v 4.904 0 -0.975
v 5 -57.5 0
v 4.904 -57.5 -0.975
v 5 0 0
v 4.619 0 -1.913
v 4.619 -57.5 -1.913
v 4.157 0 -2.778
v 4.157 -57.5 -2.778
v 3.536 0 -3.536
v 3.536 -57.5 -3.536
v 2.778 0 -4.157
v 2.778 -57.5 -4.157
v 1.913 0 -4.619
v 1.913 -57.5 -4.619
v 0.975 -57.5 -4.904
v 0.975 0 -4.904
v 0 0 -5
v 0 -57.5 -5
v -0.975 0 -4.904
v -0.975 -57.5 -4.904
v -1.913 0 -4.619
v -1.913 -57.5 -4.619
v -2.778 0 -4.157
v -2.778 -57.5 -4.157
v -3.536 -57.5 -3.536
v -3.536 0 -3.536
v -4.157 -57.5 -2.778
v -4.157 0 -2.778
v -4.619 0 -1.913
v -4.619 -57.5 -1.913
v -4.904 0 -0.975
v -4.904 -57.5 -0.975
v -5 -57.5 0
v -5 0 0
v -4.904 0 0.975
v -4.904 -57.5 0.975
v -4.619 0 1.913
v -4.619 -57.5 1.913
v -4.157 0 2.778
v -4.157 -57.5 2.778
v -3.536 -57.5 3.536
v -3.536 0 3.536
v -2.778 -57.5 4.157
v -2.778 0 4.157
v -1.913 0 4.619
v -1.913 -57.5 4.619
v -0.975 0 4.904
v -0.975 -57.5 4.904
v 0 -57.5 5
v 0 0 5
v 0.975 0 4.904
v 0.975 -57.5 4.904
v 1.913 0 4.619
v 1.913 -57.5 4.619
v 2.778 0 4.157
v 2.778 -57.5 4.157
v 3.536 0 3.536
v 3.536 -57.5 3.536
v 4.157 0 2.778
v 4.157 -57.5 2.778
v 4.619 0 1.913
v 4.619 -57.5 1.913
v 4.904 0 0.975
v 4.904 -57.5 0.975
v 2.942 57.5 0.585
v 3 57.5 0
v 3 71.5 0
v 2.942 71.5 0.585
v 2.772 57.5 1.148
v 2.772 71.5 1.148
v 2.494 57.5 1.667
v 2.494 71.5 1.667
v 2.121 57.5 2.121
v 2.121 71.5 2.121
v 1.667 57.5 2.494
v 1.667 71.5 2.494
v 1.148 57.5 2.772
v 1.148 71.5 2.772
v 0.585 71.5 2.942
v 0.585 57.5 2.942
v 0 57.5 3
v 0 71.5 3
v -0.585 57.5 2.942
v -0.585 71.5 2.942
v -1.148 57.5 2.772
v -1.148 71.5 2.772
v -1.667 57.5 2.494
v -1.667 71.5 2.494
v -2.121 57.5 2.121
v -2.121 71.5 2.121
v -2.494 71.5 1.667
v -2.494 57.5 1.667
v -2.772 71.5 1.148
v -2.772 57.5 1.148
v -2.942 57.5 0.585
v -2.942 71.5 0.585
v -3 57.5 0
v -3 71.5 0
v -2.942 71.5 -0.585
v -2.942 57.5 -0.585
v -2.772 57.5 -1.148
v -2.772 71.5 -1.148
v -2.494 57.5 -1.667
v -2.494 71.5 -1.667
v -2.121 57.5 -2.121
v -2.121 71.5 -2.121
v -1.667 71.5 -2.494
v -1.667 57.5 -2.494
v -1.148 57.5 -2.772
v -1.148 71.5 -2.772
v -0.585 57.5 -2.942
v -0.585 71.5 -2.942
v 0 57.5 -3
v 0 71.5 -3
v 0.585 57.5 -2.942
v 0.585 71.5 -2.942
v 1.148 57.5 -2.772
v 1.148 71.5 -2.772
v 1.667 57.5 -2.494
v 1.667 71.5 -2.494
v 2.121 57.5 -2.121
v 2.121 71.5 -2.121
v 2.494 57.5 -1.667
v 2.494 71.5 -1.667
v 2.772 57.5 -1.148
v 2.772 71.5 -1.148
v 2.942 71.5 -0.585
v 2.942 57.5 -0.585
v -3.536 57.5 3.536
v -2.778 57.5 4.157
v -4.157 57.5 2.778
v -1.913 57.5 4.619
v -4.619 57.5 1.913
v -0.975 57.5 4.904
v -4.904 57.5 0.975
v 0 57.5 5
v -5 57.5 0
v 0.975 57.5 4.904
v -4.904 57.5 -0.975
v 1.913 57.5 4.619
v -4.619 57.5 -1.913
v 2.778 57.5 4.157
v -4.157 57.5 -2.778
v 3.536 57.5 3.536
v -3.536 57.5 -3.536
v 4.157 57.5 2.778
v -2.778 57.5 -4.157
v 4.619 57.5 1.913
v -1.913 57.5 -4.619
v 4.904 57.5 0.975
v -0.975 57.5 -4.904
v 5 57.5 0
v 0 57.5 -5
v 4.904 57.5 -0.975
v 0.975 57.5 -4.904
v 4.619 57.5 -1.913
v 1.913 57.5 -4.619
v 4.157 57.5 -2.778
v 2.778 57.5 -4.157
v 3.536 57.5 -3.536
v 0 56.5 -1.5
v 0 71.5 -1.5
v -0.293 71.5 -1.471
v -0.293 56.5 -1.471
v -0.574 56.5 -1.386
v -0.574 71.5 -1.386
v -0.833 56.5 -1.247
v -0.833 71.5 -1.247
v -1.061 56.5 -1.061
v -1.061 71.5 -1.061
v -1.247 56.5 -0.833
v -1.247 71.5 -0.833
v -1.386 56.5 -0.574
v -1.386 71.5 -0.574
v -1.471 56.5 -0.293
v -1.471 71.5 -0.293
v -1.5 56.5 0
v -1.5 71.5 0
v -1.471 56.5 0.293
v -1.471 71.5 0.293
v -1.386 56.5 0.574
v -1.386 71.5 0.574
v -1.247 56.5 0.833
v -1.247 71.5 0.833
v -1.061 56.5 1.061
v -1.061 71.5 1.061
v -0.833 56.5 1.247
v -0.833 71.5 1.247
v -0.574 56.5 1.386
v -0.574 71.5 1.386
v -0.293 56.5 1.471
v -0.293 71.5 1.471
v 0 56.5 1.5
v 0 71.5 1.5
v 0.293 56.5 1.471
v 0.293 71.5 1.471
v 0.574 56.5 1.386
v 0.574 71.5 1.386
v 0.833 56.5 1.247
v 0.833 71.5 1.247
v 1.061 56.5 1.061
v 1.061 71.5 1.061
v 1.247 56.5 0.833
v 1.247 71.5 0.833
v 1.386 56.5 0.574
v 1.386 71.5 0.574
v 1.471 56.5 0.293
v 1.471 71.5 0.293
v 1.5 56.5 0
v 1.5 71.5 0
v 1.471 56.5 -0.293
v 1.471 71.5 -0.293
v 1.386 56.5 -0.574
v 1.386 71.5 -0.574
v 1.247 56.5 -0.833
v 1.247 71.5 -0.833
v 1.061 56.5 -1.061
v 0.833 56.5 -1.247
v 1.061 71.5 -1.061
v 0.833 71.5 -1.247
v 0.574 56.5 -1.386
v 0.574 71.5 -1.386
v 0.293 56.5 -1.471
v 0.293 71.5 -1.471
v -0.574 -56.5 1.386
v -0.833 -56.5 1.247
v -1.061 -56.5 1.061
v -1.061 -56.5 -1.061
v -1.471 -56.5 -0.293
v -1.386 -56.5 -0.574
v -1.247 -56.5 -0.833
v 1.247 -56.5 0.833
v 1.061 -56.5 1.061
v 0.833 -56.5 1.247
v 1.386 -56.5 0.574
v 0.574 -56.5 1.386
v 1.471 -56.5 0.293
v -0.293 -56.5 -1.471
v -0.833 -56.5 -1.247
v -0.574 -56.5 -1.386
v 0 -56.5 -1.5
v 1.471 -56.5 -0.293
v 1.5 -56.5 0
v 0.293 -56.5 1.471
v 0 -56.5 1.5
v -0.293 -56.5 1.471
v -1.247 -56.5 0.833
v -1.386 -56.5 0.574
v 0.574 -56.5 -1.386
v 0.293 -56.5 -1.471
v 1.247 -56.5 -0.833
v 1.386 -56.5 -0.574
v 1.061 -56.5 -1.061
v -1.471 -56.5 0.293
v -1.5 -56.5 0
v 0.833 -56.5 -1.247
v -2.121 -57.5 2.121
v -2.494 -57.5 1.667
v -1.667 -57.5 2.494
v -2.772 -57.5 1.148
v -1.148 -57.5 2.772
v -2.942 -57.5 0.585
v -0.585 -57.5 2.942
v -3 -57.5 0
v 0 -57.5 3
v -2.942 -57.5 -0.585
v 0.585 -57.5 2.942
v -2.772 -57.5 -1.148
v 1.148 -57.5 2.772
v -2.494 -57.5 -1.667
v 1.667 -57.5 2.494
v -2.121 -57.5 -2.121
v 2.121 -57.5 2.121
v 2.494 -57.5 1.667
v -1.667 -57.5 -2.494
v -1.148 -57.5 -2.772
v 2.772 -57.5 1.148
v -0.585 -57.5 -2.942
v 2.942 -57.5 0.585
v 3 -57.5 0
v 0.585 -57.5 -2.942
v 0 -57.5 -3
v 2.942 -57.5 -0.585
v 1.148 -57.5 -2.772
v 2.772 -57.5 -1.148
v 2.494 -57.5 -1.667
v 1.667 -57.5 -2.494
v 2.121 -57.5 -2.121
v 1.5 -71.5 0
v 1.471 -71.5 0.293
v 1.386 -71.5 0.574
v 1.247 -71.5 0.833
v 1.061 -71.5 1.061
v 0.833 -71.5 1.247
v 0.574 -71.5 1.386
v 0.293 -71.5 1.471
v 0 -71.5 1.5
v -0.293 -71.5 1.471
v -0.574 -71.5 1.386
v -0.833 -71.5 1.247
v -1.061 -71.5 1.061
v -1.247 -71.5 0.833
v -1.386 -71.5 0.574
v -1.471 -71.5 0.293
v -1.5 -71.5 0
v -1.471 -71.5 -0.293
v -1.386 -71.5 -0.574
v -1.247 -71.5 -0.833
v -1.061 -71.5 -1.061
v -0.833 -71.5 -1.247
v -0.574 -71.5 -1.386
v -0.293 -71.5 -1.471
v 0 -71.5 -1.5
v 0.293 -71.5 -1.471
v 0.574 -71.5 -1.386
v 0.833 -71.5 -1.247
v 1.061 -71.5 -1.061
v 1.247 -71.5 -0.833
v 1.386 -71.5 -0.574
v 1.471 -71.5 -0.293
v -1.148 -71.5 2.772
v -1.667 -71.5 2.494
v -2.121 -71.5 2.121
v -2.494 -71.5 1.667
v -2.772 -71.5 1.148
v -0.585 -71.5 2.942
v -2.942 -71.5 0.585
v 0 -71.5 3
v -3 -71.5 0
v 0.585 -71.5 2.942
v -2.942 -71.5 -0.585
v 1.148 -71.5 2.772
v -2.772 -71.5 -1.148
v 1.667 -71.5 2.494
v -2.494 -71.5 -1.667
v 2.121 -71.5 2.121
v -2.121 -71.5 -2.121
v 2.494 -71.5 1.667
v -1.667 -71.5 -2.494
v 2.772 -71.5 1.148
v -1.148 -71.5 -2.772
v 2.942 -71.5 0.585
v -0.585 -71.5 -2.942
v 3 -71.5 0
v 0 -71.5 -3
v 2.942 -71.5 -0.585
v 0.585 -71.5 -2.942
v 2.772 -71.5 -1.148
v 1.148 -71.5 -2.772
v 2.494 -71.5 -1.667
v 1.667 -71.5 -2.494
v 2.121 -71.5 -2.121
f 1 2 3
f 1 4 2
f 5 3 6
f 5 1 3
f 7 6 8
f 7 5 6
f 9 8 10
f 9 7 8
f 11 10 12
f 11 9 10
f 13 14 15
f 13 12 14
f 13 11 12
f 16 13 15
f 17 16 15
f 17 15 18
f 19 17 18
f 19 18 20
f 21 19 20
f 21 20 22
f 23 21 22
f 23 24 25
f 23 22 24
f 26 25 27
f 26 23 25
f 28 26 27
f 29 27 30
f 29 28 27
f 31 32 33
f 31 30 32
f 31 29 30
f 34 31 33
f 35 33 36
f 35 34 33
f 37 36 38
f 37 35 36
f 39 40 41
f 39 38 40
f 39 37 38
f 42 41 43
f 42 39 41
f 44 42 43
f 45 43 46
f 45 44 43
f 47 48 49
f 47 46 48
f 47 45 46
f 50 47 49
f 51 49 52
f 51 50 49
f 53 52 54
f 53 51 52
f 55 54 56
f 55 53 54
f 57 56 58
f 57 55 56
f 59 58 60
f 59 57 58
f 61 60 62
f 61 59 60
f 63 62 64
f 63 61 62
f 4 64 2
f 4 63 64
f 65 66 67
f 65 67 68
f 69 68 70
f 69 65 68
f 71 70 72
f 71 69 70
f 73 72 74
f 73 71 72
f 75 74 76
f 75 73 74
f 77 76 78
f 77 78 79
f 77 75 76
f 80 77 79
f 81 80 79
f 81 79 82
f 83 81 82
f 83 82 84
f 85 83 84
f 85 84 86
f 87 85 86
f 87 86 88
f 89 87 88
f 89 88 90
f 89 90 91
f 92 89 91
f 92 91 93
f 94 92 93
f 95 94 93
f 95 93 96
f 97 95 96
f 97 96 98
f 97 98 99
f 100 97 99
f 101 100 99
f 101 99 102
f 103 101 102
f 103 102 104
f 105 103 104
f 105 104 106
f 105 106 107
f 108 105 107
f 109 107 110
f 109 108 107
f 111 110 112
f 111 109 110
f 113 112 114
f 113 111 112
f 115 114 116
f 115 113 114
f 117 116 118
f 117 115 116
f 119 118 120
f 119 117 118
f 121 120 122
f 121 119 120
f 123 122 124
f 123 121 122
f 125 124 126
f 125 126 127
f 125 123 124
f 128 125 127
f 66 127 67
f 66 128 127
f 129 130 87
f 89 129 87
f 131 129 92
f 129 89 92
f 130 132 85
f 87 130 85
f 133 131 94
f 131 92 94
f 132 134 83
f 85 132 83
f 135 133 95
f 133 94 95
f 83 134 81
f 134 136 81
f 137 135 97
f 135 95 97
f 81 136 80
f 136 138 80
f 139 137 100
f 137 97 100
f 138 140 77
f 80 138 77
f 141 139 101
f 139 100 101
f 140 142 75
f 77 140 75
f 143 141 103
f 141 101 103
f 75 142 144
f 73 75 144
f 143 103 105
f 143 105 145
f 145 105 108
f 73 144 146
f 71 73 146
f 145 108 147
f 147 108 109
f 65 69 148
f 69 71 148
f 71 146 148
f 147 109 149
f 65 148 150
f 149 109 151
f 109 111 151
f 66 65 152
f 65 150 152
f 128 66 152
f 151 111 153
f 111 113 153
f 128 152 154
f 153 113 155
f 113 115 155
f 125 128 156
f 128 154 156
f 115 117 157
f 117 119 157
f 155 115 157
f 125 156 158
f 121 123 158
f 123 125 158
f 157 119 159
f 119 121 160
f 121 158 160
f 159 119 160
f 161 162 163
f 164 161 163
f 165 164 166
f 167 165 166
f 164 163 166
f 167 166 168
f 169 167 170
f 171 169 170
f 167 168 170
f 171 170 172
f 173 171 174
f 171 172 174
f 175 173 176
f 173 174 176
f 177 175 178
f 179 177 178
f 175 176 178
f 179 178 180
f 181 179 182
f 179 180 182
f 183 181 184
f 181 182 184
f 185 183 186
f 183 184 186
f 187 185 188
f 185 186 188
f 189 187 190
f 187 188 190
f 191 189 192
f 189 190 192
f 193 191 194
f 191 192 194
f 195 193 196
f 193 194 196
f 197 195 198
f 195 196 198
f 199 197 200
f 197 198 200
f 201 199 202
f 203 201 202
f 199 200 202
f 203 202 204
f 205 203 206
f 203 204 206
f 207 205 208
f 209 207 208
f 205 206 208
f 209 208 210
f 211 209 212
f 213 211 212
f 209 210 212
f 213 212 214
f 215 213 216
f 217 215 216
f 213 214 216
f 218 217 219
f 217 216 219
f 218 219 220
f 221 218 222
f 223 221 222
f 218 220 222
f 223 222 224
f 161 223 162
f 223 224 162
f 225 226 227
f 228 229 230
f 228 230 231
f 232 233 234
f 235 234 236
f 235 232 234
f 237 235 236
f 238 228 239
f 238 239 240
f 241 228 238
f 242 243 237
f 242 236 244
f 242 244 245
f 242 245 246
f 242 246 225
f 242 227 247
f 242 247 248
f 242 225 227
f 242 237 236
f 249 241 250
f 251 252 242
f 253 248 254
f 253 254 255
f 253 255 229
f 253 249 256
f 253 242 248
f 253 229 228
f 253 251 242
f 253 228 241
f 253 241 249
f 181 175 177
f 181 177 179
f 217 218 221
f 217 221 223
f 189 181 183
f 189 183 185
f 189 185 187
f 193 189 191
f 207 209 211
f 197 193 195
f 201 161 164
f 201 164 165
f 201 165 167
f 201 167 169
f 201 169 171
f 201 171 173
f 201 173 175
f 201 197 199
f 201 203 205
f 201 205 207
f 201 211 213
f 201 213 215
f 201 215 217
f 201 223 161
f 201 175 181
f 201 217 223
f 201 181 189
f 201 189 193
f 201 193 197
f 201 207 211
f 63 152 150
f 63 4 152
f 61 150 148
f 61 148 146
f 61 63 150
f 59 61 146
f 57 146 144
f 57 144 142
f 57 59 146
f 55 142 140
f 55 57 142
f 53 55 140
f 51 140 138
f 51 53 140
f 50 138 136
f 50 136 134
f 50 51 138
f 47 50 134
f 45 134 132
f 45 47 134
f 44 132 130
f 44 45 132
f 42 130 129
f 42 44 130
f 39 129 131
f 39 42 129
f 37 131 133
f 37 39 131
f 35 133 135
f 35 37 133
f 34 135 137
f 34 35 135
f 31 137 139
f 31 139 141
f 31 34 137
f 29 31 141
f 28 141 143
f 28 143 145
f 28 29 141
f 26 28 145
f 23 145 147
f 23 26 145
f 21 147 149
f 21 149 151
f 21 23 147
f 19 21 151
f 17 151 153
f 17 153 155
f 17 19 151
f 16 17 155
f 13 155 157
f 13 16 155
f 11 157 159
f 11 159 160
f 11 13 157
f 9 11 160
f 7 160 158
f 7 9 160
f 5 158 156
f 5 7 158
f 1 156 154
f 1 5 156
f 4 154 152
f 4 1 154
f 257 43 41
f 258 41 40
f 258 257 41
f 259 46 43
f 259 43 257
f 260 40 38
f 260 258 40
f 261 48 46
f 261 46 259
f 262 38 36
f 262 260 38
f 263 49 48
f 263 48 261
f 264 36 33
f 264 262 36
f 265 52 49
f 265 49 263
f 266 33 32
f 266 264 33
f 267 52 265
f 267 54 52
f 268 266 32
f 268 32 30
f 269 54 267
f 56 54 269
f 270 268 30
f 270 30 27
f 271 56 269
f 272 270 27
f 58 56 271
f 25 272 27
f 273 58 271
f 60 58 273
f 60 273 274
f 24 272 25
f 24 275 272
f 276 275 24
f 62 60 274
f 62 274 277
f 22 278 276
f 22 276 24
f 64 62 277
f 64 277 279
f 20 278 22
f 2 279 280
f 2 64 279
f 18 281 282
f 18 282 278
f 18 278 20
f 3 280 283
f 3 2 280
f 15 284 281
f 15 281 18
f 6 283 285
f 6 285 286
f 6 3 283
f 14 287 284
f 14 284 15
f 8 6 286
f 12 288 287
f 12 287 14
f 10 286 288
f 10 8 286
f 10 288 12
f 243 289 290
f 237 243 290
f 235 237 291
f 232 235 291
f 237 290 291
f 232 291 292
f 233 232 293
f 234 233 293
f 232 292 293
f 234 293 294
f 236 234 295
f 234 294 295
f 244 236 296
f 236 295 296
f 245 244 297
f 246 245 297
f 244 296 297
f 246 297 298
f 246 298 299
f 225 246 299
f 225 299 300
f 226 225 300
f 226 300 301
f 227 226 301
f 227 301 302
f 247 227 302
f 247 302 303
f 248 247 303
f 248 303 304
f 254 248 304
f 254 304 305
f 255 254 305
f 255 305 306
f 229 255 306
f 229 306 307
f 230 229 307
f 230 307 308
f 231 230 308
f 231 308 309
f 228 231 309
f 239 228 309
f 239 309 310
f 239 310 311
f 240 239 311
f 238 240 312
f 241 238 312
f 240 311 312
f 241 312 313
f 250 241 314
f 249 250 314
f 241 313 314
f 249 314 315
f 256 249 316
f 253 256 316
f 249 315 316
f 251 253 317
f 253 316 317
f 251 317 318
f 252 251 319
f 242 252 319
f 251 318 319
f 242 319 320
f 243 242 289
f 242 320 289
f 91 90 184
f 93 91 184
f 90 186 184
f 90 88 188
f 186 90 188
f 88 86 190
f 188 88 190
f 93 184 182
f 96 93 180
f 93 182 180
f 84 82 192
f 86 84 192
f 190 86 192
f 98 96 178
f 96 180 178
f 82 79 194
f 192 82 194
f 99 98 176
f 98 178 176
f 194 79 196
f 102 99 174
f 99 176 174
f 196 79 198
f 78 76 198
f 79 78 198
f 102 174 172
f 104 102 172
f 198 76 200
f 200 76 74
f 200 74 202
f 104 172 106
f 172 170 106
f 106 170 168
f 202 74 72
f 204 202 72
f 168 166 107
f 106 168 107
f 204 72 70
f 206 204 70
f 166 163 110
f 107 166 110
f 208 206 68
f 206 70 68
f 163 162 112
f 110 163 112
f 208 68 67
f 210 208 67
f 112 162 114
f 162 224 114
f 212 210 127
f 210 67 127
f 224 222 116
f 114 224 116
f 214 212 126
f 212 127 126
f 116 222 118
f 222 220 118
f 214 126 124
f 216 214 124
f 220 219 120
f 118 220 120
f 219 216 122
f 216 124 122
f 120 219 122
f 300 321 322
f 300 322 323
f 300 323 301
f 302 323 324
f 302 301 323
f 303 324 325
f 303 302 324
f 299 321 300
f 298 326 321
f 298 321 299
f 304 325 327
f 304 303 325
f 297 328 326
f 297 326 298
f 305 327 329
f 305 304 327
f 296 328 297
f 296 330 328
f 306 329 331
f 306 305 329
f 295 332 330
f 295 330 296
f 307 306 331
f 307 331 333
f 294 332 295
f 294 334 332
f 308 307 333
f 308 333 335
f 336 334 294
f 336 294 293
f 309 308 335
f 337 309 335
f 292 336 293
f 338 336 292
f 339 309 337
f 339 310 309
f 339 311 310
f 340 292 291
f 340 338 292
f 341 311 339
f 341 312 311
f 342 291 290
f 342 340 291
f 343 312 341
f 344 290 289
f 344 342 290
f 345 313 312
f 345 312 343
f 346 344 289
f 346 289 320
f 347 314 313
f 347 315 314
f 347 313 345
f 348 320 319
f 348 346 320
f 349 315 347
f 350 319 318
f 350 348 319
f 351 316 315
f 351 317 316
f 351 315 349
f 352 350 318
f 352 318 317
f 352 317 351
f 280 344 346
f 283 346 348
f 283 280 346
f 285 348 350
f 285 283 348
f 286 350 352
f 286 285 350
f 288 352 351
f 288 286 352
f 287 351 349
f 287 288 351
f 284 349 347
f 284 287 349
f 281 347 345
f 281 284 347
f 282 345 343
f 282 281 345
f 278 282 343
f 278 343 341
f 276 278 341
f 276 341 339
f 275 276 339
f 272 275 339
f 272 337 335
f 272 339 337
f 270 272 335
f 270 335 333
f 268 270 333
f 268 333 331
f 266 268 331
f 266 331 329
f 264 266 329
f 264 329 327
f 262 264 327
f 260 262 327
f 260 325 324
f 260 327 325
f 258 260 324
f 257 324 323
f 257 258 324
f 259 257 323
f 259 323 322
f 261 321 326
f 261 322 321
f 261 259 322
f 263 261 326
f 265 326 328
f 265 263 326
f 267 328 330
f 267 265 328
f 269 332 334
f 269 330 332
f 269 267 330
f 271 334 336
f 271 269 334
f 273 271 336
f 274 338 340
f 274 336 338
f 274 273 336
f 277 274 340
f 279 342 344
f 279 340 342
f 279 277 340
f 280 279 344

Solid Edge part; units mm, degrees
sketch "Sketch1" plane through (0, 0, 0) normal (0, -1, 0) x (1, 0, 0)
  circle A0 centre (0, 0) radius 5
extrude "Protrusion1" add sketch "Sketch1" along normal mid plane 115
sketch "Sketch2" plane through (0, 0, 0) normal (0, -1, 0) x (1, 0, 0)
  circle A0 centre (0, 0) radius 3
extrude "ExtrudedProtrusion_2" add sketch "Sketch2" along normal mid plane 143
sketch "Sketch3" plane through (0, -71.5, 0) normal (0, -1, 0) x (1, 0, 0)
  circle A0 centre (0, 0) radius 1.5
extrude "ExtrudedCutout_1" cut sketch "Sketch3" against normal blind 15
sketch "Sketch4" plane through (0, 71.5, 0) normal (0, 1, 0) x (0, 0, -1)
  circle A0 centre (0, 0) radius 1.5
extrude "ExtrudedCutout_2" cut sketch "Sketch4" against normal blind 15
properties material "Aluminum, 5050"
